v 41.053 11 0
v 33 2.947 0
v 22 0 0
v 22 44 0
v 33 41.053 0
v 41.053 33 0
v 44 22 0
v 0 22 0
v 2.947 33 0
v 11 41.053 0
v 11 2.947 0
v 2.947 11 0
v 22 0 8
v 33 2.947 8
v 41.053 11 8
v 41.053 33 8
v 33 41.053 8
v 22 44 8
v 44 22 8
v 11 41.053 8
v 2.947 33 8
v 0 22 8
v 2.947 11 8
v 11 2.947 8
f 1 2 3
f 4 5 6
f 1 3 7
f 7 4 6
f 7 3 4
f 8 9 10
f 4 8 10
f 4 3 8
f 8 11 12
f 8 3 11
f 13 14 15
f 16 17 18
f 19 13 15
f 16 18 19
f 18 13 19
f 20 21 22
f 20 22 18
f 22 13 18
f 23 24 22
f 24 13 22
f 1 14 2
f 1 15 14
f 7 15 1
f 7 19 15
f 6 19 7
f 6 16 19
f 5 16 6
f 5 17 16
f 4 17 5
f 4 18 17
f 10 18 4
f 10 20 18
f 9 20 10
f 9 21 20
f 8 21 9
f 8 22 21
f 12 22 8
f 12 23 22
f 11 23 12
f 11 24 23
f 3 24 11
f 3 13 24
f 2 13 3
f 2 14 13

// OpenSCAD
$fn = 32;

// ----------------------------------------------------------------------
// Eccentric disc: egg, 8 mm thick
// ----------------------------------------------------------------------

// --- parameters (mm) ---
profile_height = 8;       // extrusion height
profile_points = 12;      // points of the closed outline

profile = [[0, 22], [2.947, 11], [11, 2.947], [22, 0], [33, 2.947], [41.053, 11], [44, 22], [41.053, 33], [33, 41.053], [22, 44], [11, 41.053], [2.947, 33]];  // single closed polygon, 12 points, counter clockwise

// --- the one profile operation ---
linear_extrude(height = profile_height) polygon(points = profile);
